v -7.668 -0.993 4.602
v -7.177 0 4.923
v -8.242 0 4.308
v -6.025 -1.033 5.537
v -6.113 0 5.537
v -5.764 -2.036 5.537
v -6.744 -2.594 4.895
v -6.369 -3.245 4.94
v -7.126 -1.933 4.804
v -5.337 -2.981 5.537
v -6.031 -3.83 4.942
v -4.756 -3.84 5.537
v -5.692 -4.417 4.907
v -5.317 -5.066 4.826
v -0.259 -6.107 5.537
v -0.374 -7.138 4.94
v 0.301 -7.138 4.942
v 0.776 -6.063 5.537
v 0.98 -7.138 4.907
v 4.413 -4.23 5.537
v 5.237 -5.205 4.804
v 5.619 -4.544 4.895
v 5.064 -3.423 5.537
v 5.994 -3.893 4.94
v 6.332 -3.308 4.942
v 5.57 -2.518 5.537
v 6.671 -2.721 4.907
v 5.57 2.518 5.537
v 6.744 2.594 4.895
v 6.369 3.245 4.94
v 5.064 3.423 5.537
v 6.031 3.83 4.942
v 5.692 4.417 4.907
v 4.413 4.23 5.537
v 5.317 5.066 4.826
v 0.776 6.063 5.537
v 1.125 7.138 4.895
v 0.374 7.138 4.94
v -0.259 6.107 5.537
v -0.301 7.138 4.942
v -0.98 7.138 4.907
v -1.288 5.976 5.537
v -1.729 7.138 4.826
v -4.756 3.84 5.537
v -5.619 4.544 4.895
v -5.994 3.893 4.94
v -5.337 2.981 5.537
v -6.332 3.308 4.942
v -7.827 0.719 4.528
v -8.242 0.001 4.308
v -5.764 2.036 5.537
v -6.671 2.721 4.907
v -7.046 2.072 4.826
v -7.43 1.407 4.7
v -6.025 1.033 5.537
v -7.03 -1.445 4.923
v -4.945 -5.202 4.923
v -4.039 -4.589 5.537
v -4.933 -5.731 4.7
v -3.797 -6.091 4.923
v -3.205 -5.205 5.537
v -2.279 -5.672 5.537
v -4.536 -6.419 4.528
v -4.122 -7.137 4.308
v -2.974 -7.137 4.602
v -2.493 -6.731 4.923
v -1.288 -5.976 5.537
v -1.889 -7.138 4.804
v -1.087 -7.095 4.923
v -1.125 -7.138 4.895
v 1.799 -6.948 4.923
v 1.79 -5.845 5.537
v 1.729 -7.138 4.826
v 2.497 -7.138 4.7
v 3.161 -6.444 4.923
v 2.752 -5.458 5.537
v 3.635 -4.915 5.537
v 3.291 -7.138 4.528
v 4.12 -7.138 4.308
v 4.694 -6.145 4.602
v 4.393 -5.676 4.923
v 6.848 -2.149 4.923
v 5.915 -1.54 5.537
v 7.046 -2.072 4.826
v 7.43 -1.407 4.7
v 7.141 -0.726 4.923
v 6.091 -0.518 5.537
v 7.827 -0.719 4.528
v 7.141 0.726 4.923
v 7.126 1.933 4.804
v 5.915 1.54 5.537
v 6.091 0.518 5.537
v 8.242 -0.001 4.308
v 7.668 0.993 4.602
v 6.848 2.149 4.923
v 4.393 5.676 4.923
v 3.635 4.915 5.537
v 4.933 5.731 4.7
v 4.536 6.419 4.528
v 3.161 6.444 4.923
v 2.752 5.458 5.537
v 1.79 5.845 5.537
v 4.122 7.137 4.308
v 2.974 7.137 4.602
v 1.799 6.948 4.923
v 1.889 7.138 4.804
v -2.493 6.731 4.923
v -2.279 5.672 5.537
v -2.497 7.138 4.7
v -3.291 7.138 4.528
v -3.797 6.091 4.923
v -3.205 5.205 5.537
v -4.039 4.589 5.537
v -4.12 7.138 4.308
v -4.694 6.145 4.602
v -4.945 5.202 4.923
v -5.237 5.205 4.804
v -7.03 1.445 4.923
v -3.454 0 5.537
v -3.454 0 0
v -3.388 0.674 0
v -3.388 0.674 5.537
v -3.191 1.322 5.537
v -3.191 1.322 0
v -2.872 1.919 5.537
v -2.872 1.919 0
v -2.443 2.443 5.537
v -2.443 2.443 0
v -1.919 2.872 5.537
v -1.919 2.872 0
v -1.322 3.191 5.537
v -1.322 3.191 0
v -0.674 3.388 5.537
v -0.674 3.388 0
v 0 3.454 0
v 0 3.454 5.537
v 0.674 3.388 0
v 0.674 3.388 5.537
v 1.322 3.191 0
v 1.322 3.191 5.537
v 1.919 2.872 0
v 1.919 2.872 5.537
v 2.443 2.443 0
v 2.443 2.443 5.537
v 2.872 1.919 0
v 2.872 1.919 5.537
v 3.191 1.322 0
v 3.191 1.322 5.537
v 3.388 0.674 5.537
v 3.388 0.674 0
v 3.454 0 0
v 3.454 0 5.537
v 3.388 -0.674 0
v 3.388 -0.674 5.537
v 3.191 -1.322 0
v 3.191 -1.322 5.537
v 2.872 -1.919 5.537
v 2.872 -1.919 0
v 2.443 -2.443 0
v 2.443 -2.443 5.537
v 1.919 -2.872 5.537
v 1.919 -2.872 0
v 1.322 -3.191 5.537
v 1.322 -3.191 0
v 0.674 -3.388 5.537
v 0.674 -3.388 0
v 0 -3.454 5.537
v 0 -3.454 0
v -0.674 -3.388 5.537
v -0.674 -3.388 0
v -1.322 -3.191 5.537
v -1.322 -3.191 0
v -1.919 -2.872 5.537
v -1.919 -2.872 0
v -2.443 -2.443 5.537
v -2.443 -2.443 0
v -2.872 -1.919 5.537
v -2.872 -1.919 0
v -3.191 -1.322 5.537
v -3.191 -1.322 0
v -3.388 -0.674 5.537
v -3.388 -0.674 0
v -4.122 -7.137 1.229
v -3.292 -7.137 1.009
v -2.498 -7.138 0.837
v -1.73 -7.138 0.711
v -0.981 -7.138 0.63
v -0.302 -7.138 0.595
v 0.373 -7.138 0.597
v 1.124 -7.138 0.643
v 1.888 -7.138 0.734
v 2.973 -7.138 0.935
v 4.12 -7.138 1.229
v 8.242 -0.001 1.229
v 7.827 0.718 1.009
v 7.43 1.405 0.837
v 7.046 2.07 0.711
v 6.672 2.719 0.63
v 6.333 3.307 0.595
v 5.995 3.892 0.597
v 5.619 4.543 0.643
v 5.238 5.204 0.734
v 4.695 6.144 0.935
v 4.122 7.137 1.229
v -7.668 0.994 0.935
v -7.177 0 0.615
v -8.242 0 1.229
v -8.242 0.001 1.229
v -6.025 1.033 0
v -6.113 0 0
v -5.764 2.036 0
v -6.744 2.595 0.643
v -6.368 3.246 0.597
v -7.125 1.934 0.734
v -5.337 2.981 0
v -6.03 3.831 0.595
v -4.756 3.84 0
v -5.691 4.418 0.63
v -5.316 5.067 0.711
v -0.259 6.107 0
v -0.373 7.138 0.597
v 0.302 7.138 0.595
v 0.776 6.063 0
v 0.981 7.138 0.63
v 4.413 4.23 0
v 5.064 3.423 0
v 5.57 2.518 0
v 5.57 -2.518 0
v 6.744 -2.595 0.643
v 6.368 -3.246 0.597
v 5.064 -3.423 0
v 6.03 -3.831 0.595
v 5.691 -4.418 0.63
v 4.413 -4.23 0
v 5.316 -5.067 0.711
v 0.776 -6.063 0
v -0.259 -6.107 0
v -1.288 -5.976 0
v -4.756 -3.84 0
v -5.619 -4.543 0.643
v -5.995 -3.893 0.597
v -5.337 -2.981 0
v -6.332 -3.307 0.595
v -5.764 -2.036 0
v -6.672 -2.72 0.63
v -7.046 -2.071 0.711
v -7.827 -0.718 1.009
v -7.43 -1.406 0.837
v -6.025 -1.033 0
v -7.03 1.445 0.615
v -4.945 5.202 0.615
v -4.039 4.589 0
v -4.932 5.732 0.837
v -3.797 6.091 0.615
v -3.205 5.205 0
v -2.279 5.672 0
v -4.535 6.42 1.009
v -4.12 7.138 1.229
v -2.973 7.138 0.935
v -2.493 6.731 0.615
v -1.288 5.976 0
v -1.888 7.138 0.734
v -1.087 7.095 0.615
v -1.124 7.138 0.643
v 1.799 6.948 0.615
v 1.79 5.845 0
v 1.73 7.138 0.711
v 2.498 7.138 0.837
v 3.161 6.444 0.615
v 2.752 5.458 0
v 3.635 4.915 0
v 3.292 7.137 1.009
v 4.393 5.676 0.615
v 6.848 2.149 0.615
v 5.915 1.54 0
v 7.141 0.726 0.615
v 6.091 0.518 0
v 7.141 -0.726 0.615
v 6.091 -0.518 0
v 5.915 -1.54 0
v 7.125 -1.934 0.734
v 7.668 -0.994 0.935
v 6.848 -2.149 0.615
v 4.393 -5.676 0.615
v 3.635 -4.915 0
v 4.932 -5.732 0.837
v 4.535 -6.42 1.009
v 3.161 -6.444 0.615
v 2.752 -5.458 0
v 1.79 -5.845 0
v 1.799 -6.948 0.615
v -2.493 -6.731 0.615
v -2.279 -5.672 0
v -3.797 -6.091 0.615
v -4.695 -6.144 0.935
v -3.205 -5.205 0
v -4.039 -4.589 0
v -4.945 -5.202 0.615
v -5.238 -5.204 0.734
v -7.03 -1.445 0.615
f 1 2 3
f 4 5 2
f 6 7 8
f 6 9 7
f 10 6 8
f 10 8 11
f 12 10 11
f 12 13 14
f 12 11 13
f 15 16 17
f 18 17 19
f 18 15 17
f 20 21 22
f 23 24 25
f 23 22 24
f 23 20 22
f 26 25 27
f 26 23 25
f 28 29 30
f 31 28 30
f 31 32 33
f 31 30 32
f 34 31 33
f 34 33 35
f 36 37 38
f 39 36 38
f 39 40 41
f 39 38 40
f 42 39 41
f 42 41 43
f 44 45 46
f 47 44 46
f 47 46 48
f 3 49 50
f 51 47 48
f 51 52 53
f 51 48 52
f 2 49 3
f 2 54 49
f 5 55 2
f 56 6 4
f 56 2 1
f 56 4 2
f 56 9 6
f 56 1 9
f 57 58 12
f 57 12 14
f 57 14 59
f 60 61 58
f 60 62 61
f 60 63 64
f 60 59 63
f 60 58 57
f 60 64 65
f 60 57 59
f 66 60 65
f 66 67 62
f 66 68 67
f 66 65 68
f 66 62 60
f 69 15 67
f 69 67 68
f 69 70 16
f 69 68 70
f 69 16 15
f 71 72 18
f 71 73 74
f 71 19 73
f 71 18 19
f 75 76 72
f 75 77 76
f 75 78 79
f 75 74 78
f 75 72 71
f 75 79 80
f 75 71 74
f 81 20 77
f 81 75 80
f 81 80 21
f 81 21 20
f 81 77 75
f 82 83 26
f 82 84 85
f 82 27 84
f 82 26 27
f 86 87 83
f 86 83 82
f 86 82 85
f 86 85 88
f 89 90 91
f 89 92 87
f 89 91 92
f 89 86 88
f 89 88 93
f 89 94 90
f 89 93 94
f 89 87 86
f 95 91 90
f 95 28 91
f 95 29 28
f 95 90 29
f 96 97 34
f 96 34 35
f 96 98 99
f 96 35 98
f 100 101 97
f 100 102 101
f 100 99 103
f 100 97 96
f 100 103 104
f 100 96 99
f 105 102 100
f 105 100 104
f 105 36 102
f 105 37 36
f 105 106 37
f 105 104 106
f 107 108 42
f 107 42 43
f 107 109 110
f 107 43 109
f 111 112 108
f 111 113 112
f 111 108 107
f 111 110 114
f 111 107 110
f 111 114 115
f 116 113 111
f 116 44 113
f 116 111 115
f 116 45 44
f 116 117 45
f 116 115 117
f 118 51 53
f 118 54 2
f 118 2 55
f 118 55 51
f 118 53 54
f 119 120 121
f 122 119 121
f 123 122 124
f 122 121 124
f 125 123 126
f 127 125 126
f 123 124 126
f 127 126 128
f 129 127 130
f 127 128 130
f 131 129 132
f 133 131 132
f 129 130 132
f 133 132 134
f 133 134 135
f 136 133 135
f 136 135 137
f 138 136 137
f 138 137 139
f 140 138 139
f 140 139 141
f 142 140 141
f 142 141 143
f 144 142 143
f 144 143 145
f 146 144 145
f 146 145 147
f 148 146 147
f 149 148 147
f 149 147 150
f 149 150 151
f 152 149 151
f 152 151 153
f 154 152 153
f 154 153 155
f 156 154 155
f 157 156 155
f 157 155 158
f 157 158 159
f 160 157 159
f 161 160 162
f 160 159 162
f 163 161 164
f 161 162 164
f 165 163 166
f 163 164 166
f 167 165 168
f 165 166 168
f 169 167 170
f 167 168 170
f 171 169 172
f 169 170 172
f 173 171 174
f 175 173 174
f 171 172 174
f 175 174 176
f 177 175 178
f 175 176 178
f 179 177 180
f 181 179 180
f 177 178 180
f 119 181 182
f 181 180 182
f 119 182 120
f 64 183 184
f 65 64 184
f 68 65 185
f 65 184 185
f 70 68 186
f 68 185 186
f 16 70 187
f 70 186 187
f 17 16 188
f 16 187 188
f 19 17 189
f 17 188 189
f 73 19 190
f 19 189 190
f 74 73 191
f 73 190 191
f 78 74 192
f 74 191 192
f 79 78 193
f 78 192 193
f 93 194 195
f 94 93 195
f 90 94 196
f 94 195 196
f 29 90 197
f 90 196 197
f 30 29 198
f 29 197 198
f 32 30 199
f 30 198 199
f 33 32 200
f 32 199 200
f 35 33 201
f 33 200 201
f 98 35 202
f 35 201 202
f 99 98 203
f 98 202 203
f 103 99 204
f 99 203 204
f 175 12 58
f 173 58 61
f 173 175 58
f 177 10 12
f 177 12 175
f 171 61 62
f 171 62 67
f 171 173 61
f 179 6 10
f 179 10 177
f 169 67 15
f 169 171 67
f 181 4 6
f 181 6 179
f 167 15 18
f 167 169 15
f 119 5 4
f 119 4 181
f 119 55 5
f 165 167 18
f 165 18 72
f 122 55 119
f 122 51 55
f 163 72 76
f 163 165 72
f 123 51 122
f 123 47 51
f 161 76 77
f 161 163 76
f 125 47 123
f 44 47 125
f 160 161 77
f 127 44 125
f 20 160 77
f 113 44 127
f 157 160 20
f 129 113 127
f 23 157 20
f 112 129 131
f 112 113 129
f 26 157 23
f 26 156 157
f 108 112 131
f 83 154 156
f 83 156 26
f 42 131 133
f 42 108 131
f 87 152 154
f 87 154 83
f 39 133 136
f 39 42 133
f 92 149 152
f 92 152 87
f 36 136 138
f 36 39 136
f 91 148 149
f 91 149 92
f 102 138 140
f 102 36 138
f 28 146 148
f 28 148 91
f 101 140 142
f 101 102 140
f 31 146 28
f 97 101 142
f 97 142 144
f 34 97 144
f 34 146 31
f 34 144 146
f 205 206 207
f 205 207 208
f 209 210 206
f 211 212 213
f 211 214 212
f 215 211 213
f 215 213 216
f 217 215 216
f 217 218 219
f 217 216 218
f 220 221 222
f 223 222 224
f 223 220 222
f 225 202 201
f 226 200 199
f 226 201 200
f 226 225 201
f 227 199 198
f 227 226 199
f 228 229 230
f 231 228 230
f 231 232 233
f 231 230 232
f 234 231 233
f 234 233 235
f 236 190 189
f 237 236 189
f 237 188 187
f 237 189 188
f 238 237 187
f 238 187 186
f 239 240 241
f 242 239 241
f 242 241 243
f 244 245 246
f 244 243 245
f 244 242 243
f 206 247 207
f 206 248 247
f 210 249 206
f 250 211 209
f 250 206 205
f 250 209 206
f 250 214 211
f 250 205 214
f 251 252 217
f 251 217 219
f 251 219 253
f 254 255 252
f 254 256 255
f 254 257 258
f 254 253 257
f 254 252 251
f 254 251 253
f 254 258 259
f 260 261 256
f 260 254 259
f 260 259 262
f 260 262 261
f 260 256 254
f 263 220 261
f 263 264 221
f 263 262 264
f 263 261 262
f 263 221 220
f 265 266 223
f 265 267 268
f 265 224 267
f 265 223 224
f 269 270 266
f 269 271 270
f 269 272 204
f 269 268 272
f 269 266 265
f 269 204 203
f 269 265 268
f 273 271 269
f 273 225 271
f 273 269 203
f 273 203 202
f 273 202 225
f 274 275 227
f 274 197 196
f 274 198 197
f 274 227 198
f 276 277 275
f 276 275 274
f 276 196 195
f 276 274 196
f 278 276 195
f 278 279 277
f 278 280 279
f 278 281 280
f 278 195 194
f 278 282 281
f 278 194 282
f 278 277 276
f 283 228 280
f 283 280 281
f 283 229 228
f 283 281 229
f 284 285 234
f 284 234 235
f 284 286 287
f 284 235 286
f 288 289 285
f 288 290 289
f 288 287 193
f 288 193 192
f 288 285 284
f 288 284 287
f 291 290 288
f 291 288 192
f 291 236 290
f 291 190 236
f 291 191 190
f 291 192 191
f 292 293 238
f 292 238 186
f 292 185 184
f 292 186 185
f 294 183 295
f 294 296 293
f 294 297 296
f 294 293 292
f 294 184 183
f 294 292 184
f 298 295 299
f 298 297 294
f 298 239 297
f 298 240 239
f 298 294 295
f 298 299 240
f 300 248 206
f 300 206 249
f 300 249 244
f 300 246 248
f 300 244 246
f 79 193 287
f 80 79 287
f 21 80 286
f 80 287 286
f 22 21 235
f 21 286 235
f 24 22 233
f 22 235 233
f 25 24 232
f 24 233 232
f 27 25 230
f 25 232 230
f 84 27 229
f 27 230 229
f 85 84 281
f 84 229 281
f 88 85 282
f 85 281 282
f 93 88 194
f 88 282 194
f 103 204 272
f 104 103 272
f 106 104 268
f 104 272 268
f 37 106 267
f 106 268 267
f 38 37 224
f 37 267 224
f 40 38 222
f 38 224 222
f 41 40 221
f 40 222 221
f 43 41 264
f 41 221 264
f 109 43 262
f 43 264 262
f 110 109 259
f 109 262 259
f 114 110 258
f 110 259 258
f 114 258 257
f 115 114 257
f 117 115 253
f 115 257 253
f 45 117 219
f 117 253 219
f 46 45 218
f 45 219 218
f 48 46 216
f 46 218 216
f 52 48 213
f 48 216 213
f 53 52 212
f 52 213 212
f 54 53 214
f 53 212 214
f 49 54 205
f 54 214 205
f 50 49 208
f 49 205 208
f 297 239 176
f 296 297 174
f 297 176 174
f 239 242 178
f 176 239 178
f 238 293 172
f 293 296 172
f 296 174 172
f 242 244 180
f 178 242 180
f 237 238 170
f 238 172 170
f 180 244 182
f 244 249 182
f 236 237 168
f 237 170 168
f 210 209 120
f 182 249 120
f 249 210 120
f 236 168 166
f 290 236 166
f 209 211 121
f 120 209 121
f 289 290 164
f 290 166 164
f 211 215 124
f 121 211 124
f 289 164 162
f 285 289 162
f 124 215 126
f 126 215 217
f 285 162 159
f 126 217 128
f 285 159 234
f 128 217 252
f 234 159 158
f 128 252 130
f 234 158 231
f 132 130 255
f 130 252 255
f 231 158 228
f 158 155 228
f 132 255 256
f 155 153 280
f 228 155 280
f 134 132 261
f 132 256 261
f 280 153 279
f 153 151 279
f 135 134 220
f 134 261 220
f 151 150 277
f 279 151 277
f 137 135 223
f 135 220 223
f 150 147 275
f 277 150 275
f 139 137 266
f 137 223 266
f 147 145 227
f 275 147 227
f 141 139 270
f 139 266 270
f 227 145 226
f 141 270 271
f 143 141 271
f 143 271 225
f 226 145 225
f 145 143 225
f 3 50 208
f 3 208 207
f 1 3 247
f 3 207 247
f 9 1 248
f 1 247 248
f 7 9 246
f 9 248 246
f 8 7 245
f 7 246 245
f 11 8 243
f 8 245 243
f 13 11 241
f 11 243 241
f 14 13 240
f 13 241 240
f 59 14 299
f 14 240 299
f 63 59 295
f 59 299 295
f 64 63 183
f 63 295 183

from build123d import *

# Parameters (mm, degrees)
BOSS_EXTRUDE1_DEPTH          = 5.5372
SKETCH6_OUTSIDE_W            = 68.81
SKETCH6_OUTSIDE_H            = 66.602
SKETCH6_OUTSIDE_R            = 6.112735428
CUT_EXTRUDE4_DEPTH           = 13.228781918
CUT_EXTRUDE4_DRAFT           = -60
MIRROR1_COPY_1_SKETCH_W      = 68.81
MIRROR1_COPY_1_SKETCH_H      = 66.602
MIRROR1_COPY_1_SKETCH_R      = 6.112735428
MIRROR1_COPY_1_DEPTH         = 13.228781918
MIRROR1_COPY_1_DRAFT         = -60
F_5_16_24_TAPPED_HOLE2_D     = 6.9088
F_5_16_24_TAPPED_HOLE2_DEPTH = 21.336
F_5_16_24_TAPPED_HOLE2_TIP   = 2.075612922


with BuildPart() as part:
    # Sketch1 → Boss-Extrude1 (new body)
    with BuildSketch(Plane.XY):
        Polygon((4.121592226, 7.1374), (-4.120373604, 7.138103572), (-8.24196583, 0.000703572), (-4.121592226, -7.1374), (4.120373604, -7.138103572), (8.24196583, -0.000703572), align=None)
    extrude(amount=BOSS_EXTRUDE1_DEPTH)


with BuildPart() as cut_extrude4_tool:
    # Sketch6 outside → Cut-Extrude4 (with draft: the straight prism first)
    with BuildSketch(Plane(origin=(0, 0, 0), x_dir=(-1, 0, 0), z_dir=(0, 0, -1))):
        Rectangle(SKETCH6_OUTSIDE_W, SKETCH6_OUTSIDE_H)
        Circle(SKETCH6_OUTSIDE_R, mode=Mode.SUBTRACT)
    extrude(amount=-CUT_EXTRUDE4_DEPTH)
    # Cut-Extrude4: the draft: its side faces are tilted about the plane it starts from
    cut_extrude4_sides = [cut_extrude4_tool.faces().sort_by_distance(p)[0] for p in [
        (0, -33.301, 6.614390959),
        (-34.405, 0, 6.614390959),
        (0, 33.301, 6.614390959),
        (34.405, 0, 6.614390959),
        (6.112735428, 0, 6.614390959),
    ]]
    draft(cut_extrude4_sides, Plane(origin=(0, 0, 0), x_dir=(-1, 0, 0), z_dir=(0, 0, -1)), CUT_EXTRUDE4_DRAFT)


with BuildPart() as part_1:
    add(part.part)

    # Cut-Extrude4: cut by cut_extrude4_tool
    add(cut_extrude4_tool.part, mode=Mode.SUBTRACT)


with BuildPart() as mirror1_copy_1_tool:
    # Mirror1 copy 1 sketch → Mirror1 copy 1 (with draft: the straight prism first)
    with BuildSketch(Plane(origin=(0, 0, 5.5372), x_dir=(-1, 0, 0), z_dir=(0, 0, 1))):
        Rectangle(MIRROR1_COPY_1_SKETCH_W, MIRROR1_COPY_1_SKETCH_H)
        Circle(MIRROR1_COPY_1_SKETCH_R, mode=Mode.SUBTRACT)
    extrude(amount=-MIRROR1_COPY_1_DEPTH)
    # Mirror1 copy 1: the draft: its side faces are tilted about the plane it starts from
    mirror1_copy_1_sides = [mirror1_copy_1_tool.faces().sort_by_distance(p)[0] for p in [
        (0, -33.301, -1.077190959),
        (-34.405, 0, -1.077190959),
        (0, 33.301, -1.077190959),
        (34.405, 0, -1.077190959),
        (6.112735428, 0, -1.077190959),
    ]]
    draft(mirror1_copy_1_sides, Plane(origin=(0, 0, 5.5372), x_dir=(-1, 0, 0), z_dir=(0, 0, 1)), MIRROR1_COPY_1_DRAFT)


with BuildPart() as part_2:
    add(part_1.part)

    # Mirror1 copy 1: cut by mirror1_copy_1_tool
    add(mirror1_copy_1_tool.part, mode=Mode.SUBTRACT)

    # 5/16-24 Tapped Hole2
    with Locations(Plane.XY.offset(5.5372)):
        with Locations((0, 0)):
            Hole(F_5_16_24_TAPPED_HOLE2_D / 2, depth=F_5_16_24_TAPPED_HOLE2_DEPTH)
            with Locations((0, 0, -(F_5_16_24_TAPPED_HOLE2_DEPTH + F_5_16_24_TAPPED_HOLE2_TIP / 2))):  # 118° drill point
                Cone(0, F_5_16_24_TAPPED_HOLE2_D / 2, F_5_16_24_TAPPED_HOLE2_TIP, mode=Mode.SUBTRACT)


solid = part_2.part
